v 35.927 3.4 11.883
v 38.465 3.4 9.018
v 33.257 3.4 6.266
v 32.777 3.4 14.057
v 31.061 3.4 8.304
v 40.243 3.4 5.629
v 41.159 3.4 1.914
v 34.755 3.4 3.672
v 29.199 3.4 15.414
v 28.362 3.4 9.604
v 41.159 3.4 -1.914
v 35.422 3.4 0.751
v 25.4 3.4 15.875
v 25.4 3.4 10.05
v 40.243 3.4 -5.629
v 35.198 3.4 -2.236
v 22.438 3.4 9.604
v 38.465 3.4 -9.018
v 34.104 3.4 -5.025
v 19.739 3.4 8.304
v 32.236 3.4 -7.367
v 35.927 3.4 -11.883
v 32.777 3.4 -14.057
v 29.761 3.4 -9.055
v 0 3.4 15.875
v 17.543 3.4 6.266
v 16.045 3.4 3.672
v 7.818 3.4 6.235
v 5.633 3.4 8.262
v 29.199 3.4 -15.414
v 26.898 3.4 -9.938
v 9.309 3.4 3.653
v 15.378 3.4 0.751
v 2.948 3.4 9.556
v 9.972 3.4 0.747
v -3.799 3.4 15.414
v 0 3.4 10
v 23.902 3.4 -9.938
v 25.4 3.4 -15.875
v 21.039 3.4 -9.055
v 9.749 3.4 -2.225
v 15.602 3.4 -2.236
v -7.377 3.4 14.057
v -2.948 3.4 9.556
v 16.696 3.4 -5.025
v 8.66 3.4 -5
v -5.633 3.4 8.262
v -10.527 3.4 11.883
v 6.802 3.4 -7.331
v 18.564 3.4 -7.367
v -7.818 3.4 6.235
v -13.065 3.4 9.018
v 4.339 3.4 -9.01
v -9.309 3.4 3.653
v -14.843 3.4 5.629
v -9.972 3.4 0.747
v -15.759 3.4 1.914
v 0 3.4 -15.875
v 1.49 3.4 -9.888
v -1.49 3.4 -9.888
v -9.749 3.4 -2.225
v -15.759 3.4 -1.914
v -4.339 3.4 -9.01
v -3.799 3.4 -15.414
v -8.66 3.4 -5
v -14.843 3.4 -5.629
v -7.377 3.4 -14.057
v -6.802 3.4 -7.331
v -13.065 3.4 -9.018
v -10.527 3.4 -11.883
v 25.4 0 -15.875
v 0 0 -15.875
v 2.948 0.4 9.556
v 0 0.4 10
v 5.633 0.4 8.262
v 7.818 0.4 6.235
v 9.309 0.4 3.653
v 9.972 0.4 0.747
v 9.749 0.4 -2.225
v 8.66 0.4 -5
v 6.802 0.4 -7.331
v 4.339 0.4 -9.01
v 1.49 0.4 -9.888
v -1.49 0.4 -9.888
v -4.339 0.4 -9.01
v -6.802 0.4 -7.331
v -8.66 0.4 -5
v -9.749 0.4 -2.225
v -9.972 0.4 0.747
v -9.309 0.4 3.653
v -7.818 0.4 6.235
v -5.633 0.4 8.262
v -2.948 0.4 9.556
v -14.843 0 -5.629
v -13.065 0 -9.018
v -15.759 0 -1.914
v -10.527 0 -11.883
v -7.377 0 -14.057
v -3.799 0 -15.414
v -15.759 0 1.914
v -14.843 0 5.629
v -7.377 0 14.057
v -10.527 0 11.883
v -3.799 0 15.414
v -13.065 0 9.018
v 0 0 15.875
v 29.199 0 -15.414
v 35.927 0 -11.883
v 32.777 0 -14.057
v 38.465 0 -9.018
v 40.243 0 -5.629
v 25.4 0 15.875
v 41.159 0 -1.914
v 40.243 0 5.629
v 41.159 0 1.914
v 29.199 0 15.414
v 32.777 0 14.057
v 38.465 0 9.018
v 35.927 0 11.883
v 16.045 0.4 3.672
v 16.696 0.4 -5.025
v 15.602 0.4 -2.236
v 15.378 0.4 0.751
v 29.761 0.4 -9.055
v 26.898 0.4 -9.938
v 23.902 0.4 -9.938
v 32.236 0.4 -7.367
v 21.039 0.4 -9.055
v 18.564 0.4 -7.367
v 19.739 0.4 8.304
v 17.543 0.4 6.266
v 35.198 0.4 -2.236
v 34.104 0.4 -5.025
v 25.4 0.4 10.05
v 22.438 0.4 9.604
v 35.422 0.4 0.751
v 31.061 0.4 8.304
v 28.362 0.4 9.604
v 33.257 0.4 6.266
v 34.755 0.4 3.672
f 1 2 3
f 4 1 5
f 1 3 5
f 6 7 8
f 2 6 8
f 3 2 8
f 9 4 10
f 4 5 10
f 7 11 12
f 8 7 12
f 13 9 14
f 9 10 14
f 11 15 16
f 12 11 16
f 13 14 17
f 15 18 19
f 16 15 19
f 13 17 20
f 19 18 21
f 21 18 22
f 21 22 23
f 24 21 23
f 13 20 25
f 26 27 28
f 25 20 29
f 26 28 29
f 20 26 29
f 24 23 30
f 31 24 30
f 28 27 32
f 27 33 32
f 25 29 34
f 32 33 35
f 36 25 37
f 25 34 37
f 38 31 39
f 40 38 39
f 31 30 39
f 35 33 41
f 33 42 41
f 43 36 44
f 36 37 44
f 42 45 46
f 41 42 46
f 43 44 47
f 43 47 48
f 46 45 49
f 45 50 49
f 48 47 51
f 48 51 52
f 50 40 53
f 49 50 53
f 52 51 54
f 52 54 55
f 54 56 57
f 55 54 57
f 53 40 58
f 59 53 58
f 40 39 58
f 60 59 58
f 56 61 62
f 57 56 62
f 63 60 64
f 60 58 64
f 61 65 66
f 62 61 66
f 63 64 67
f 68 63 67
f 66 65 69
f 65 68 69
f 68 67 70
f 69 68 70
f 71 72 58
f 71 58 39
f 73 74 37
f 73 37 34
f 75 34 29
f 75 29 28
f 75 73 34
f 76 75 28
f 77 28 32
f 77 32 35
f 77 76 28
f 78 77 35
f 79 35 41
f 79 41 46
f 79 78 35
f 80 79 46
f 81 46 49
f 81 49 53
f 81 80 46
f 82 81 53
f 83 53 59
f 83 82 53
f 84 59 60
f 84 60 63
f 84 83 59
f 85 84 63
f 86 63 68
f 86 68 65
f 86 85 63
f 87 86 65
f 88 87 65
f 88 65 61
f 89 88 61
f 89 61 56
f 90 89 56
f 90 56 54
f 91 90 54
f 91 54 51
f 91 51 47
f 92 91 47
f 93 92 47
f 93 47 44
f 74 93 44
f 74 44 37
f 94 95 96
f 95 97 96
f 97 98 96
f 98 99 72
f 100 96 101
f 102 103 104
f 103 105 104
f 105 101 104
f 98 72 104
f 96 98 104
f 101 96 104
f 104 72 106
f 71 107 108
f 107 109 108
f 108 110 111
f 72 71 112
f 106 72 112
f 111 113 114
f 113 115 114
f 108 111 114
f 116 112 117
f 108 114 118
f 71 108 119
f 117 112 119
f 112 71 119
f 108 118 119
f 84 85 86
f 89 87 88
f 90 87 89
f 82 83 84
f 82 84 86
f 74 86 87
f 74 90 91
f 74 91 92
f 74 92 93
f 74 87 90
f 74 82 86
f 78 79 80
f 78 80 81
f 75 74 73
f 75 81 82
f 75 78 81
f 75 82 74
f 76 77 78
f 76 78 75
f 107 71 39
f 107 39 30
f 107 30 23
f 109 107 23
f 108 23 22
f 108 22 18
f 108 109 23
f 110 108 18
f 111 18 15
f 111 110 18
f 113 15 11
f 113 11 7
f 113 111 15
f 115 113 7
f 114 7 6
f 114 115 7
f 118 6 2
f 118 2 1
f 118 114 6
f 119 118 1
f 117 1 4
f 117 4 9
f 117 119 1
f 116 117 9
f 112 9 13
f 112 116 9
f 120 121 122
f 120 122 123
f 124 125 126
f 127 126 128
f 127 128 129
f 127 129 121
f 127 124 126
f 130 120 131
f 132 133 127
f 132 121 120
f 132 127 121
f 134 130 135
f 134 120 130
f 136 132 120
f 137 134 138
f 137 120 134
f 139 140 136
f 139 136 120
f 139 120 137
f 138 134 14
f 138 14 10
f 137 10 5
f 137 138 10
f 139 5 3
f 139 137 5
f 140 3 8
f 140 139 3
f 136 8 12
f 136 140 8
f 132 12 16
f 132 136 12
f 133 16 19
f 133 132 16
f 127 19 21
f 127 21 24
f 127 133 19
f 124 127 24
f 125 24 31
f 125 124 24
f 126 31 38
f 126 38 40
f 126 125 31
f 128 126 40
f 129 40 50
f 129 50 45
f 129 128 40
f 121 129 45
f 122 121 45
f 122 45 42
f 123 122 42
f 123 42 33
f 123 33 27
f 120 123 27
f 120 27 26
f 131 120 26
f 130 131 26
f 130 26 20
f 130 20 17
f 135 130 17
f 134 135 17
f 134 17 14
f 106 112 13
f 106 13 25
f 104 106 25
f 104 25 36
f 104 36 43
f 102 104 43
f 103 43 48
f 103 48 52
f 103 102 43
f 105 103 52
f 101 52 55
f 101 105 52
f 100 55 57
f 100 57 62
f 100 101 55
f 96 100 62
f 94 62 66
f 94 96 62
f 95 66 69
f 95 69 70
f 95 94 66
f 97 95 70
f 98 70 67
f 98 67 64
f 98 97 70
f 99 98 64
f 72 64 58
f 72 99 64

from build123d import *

# Parameters (mm, degrees)
SKETCH1_R           = 10
SKETCH1_R_2         = 10.05
BOSS_EXTRUDE1_DEPTH = 3.4
SKETCH1_2_R         = 10
SKETCH1_2_R_2       = 10.05
BOSS_EXTRUDE2_DEPTH = 0.4


with BuildPart() as part:
    # Sketch1 → Boss-Extrude1 (new body)
    with BuildSketch(Plane(origin=(0, 0, 0), x_dir=(1, 0, 0), z_dir=(0, 1, 0))):
        with BuildLine():
            Line((0, 15.875), (25.4, 15.875))
            ThreePointArc((25.4, 15.875), (41.275, 0), (25.4, -15.875))
            Line((25.4, -15.875), (0, -15.875))
            ThreePointArc((0, -15.875), (-15.875, 0), (0, 15.875))
        make_face()
        Circle(SKETCH1_R, mode=Mode.SUBTRACT)
        with Locations((25.4, 0)):
            Circle(SKETCH1_R_2, mode=Mode.SUBTRACT)
    extrude(amount=BOSS_EXTRUDE1_DEPTH)

    # Sketch1<2> → Boss-Extrude2 (add)
    with BuildSketch(Plane(origin=(0, 0, 0), x_dir=(1, 0, 0), z_dir=(0, 1, 0))):
        Circle(SKETCH1_2_R)
        with Locations((25.4, 0)):
            Circle(SKETCH1_2_R_2)
    extrude(amount=BOSS_EXTRUDE2_DEPTH)


solid = part.part
